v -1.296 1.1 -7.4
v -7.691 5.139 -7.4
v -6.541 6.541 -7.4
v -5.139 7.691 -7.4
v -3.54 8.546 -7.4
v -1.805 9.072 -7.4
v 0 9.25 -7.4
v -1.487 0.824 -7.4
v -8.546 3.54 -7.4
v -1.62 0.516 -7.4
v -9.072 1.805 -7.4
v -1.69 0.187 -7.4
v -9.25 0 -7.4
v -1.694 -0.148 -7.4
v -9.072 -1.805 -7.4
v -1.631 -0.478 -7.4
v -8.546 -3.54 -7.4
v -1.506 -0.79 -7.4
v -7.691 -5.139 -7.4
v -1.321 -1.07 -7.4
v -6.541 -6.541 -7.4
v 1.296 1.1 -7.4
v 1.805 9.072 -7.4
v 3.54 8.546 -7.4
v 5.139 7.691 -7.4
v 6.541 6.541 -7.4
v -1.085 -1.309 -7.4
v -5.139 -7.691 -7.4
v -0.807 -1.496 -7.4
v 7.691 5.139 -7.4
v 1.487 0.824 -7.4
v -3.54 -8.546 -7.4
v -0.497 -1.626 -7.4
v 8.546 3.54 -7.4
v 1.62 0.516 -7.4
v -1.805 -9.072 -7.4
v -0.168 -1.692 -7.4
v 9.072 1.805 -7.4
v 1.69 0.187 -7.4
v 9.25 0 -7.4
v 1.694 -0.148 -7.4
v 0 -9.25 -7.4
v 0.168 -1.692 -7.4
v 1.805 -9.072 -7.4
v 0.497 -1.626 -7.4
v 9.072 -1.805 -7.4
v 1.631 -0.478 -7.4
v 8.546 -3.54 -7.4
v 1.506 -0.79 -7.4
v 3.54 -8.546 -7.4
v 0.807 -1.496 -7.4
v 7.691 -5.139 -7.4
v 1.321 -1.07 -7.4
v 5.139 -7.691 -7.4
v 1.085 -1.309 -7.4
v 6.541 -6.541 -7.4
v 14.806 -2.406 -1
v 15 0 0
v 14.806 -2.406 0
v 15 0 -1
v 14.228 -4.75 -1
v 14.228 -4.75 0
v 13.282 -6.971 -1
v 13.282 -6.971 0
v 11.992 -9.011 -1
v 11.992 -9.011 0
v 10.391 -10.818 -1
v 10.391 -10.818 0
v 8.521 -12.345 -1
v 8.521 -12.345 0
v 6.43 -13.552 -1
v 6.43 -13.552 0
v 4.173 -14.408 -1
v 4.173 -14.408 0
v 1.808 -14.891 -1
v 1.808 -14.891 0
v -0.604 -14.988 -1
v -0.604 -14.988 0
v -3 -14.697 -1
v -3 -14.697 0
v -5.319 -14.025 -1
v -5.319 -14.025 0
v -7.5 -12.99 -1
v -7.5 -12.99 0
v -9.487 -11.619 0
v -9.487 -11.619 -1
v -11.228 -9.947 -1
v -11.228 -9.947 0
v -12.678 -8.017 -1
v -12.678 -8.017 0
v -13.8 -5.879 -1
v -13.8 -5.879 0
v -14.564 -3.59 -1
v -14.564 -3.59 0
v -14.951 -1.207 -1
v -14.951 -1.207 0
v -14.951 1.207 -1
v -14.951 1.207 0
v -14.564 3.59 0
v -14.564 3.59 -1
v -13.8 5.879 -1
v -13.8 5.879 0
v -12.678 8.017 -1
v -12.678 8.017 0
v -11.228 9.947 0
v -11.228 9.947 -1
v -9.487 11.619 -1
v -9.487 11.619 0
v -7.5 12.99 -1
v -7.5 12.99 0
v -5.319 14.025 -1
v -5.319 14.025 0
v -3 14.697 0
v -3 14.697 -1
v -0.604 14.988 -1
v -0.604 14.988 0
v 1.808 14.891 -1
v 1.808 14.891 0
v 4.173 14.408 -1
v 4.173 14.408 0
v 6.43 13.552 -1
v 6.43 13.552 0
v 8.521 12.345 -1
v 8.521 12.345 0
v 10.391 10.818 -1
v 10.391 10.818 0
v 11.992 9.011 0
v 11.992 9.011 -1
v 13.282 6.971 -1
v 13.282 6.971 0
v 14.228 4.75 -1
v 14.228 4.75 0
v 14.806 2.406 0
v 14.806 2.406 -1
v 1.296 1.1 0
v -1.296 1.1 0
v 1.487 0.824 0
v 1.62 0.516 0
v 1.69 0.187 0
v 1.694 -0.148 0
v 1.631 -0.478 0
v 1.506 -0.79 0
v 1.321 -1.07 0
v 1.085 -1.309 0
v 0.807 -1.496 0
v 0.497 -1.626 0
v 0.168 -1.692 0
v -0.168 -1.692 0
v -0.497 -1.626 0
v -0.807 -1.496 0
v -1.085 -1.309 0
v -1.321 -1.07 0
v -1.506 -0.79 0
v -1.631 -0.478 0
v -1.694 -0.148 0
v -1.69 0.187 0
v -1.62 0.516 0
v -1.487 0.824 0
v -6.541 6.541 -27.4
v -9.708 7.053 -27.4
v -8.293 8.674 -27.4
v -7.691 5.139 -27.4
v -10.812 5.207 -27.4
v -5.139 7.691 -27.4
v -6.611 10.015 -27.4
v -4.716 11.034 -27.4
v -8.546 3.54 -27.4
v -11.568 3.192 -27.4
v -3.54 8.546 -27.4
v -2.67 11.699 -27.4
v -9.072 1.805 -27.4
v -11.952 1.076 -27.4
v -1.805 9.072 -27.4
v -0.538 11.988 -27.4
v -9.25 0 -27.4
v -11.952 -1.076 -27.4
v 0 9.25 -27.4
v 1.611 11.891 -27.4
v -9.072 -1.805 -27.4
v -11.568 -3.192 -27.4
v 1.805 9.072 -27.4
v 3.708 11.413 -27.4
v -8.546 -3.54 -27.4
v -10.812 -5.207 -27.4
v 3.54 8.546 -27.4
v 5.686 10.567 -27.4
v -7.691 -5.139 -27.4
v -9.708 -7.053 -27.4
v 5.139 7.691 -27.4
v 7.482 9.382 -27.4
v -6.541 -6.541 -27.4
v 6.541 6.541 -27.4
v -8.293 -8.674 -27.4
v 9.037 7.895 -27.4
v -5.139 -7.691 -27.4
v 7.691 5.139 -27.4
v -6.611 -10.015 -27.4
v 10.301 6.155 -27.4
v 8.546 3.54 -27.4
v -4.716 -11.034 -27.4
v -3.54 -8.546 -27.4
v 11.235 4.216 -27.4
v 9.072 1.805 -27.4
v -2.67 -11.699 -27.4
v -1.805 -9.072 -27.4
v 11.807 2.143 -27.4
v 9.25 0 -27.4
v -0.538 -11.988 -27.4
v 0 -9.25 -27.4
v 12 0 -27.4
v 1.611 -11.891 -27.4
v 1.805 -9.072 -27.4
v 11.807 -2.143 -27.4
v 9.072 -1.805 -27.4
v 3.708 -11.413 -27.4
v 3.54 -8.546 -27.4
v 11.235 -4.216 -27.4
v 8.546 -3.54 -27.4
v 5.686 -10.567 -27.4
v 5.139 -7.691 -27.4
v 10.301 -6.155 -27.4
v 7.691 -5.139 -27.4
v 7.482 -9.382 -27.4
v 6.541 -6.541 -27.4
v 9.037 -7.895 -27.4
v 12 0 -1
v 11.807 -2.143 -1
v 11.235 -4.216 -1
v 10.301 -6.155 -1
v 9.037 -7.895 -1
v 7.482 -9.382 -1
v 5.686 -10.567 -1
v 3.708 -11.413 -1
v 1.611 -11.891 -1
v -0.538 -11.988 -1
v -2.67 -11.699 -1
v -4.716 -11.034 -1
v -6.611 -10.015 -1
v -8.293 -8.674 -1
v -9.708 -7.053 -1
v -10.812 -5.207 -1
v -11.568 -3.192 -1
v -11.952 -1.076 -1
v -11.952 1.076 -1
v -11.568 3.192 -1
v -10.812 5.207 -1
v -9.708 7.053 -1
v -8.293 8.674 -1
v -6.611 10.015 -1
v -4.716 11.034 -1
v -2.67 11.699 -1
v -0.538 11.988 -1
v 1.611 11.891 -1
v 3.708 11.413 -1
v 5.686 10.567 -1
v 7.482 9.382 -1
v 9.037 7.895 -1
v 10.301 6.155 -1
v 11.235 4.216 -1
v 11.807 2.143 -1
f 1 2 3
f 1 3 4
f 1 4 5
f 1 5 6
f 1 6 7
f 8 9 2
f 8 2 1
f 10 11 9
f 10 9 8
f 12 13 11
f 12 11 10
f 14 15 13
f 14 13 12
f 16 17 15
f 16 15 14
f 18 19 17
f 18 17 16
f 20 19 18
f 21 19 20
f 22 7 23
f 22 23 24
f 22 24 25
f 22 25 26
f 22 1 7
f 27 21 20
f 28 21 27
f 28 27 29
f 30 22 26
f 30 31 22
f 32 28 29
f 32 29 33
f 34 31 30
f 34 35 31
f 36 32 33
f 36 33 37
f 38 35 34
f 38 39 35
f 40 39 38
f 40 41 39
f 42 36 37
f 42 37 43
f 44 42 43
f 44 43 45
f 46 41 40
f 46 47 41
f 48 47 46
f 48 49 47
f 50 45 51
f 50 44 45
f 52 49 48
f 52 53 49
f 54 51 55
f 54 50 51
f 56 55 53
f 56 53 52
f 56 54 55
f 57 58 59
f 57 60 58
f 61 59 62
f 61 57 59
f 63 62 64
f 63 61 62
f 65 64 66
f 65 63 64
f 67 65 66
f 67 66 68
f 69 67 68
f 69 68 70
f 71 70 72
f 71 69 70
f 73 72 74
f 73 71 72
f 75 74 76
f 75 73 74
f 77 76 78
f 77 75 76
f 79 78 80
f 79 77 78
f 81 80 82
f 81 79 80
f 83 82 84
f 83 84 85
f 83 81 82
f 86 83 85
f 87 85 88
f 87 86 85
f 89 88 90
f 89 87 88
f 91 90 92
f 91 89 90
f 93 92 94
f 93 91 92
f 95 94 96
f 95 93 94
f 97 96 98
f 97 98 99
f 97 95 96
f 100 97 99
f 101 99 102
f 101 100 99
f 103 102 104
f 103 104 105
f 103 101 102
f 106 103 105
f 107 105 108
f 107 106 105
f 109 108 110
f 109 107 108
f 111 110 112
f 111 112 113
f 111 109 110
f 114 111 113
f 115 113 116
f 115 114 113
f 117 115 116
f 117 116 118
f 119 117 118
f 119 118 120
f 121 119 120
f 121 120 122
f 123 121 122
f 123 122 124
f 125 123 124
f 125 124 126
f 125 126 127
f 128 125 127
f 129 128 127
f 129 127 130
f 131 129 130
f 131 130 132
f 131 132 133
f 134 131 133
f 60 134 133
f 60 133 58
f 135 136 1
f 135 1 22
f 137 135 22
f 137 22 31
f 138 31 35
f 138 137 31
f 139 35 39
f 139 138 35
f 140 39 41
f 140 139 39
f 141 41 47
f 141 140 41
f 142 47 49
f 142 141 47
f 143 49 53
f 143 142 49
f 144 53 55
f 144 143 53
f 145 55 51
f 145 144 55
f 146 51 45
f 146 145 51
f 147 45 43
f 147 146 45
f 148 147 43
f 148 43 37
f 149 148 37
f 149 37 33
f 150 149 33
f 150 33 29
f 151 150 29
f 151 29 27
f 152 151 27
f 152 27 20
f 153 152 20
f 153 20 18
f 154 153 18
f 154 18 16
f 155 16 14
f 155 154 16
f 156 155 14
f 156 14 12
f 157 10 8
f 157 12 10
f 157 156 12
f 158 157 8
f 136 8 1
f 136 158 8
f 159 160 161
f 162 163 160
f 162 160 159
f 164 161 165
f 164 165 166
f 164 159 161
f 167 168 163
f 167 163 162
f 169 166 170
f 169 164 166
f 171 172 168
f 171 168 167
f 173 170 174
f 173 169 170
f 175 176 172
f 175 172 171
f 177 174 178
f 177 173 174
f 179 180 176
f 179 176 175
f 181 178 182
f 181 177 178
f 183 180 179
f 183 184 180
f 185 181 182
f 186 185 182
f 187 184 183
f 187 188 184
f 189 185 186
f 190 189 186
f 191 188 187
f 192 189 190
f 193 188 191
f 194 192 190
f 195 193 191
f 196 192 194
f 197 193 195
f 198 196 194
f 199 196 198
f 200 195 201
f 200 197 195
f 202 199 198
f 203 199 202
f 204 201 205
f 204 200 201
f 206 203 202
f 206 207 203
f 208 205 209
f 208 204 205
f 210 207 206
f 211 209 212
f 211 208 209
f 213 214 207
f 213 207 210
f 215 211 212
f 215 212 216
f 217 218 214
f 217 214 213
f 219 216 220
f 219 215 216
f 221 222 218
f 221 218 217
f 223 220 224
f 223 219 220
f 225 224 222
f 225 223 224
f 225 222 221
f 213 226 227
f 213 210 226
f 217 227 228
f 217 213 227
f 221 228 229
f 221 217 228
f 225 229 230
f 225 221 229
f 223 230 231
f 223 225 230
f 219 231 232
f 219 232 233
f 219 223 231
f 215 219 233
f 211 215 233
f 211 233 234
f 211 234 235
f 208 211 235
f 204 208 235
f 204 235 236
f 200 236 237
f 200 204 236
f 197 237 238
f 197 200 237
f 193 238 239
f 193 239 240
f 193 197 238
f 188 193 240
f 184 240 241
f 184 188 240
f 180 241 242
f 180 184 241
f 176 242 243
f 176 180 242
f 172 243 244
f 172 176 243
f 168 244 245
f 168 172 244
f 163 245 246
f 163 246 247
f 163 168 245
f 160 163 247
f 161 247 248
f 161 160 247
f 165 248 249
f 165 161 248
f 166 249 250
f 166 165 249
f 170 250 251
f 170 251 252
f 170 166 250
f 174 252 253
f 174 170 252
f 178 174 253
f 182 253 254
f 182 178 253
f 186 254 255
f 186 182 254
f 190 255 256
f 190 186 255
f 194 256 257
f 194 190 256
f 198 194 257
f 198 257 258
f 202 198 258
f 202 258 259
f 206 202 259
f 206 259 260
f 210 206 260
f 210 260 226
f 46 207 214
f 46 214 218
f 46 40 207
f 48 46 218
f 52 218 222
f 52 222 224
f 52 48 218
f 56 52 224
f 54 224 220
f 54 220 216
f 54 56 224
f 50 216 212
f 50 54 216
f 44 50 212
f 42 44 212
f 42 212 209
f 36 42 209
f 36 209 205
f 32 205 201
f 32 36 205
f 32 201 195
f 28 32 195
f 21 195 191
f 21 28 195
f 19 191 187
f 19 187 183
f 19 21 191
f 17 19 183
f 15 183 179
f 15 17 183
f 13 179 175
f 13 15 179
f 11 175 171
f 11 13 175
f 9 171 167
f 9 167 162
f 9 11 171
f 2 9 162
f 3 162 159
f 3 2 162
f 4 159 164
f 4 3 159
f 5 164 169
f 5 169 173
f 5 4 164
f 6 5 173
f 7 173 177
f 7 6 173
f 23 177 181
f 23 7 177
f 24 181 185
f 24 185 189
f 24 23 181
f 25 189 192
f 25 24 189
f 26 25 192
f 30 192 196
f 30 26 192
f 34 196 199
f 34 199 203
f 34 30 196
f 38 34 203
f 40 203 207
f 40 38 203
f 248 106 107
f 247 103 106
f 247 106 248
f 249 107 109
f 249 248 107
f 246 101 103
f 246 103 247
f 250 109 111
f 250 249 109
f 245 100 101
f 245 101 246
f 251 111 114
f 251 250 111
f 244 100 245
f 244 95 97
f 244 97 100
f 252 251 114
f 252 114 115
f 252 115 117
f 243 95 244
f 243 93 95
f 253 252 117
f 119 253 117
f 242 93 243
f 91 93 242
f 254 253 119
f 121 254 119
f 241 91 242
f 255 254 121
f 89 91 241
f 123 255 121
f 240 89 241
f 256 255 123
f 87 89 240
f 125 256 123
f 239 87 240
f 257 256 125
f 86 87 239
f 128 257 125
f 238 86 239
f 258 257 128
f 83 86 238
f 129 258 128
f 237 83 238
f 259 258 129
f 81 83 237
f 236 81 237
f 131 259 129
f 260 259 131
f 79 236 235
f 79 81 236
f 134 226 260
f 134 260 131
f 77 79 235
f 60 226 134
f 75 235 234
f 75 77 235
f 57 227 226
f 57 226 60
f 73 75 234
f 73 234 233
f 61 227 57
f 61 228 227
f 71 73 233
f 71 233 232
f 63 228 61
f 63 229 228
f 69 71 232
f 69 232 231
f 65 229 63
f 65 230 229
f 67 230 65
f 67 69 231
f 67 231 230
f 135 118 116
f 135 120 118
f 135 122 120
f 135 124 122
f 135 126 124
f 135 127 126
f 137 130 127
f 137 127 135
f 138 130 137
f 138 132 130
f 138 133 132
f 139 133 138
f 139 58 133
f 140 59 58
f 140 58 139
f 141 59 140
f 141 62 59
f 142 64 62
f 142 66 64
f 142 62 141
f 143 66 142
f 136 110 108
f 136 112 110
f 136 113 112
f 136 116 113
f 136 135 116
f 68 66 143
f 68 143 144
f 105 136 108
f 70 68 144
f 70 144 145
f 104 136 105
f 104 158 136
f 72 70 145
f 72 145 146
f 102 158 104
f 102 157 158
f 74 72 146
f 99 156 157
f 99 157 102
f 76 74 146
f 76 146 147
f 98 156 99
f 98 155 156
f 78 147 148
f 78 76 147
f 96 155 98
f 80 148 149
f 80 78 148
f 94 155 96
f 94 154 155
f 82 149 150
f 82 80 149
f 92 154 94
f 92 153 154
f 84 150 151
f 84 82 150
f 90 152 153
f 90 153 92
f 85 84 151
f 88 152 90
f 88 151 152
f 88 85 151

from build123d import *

# Parameters (mm, degrees)
CUT_EXTRUDE_1_DEPTH = 10


with BuildPart() as part:
    # Эскиз1 → Повернуть1 (revolve)
    with BuildSketch(Plane(origin=(0, 0, 0), x_dir=(1, 0, 0), z_dir=(0, 1, 0))):
        Polygon((0, 0), (15, 0), (15, 1), (12, 1), (12, 27.4), (9.25, 27.4), (9.25, 7.4), (0, 7.4), align=None)
    revolve(axis=Axis((0, 0, 0), (0, 0, -1)))

    # Эскиз2 → Вырез-Вытянуть1 (cut)
    # profile 1 of 2: a face of its own
    with BuildSketch(Plane.XY):
        with BuildLine():
            Line((-1.29614814, 1.1), (1.29614814, 1.1))
            ThreePointArc((1.29614814, 1.1), (0, -1.7), (-1.29614814, 1.1))
        make_face()
        with BuildLine():
            ThreePointArc((-1.2, 0.9), (0, -1.5), (1.2, 0.9))
            Line((1.2, 0.9), (-1.2, 0.9))
        make_face(mode=Mode.SUBTRACT)
    # profile 2 of 2: a face of its own
    with BuildSketch(Plane.XY):
        with BuildLine():
            Line((-1.2, 0.9), (1.2, 0.9))
            ThreePointArc((1.2, 0.9), (0, -1.5), (-1.2, 0.9))
        make_face()
    extrude(amount=-CUT_EXTRUDE_1_DEPTH, mode=Mode.SUBTRACT)


solid = part.part
